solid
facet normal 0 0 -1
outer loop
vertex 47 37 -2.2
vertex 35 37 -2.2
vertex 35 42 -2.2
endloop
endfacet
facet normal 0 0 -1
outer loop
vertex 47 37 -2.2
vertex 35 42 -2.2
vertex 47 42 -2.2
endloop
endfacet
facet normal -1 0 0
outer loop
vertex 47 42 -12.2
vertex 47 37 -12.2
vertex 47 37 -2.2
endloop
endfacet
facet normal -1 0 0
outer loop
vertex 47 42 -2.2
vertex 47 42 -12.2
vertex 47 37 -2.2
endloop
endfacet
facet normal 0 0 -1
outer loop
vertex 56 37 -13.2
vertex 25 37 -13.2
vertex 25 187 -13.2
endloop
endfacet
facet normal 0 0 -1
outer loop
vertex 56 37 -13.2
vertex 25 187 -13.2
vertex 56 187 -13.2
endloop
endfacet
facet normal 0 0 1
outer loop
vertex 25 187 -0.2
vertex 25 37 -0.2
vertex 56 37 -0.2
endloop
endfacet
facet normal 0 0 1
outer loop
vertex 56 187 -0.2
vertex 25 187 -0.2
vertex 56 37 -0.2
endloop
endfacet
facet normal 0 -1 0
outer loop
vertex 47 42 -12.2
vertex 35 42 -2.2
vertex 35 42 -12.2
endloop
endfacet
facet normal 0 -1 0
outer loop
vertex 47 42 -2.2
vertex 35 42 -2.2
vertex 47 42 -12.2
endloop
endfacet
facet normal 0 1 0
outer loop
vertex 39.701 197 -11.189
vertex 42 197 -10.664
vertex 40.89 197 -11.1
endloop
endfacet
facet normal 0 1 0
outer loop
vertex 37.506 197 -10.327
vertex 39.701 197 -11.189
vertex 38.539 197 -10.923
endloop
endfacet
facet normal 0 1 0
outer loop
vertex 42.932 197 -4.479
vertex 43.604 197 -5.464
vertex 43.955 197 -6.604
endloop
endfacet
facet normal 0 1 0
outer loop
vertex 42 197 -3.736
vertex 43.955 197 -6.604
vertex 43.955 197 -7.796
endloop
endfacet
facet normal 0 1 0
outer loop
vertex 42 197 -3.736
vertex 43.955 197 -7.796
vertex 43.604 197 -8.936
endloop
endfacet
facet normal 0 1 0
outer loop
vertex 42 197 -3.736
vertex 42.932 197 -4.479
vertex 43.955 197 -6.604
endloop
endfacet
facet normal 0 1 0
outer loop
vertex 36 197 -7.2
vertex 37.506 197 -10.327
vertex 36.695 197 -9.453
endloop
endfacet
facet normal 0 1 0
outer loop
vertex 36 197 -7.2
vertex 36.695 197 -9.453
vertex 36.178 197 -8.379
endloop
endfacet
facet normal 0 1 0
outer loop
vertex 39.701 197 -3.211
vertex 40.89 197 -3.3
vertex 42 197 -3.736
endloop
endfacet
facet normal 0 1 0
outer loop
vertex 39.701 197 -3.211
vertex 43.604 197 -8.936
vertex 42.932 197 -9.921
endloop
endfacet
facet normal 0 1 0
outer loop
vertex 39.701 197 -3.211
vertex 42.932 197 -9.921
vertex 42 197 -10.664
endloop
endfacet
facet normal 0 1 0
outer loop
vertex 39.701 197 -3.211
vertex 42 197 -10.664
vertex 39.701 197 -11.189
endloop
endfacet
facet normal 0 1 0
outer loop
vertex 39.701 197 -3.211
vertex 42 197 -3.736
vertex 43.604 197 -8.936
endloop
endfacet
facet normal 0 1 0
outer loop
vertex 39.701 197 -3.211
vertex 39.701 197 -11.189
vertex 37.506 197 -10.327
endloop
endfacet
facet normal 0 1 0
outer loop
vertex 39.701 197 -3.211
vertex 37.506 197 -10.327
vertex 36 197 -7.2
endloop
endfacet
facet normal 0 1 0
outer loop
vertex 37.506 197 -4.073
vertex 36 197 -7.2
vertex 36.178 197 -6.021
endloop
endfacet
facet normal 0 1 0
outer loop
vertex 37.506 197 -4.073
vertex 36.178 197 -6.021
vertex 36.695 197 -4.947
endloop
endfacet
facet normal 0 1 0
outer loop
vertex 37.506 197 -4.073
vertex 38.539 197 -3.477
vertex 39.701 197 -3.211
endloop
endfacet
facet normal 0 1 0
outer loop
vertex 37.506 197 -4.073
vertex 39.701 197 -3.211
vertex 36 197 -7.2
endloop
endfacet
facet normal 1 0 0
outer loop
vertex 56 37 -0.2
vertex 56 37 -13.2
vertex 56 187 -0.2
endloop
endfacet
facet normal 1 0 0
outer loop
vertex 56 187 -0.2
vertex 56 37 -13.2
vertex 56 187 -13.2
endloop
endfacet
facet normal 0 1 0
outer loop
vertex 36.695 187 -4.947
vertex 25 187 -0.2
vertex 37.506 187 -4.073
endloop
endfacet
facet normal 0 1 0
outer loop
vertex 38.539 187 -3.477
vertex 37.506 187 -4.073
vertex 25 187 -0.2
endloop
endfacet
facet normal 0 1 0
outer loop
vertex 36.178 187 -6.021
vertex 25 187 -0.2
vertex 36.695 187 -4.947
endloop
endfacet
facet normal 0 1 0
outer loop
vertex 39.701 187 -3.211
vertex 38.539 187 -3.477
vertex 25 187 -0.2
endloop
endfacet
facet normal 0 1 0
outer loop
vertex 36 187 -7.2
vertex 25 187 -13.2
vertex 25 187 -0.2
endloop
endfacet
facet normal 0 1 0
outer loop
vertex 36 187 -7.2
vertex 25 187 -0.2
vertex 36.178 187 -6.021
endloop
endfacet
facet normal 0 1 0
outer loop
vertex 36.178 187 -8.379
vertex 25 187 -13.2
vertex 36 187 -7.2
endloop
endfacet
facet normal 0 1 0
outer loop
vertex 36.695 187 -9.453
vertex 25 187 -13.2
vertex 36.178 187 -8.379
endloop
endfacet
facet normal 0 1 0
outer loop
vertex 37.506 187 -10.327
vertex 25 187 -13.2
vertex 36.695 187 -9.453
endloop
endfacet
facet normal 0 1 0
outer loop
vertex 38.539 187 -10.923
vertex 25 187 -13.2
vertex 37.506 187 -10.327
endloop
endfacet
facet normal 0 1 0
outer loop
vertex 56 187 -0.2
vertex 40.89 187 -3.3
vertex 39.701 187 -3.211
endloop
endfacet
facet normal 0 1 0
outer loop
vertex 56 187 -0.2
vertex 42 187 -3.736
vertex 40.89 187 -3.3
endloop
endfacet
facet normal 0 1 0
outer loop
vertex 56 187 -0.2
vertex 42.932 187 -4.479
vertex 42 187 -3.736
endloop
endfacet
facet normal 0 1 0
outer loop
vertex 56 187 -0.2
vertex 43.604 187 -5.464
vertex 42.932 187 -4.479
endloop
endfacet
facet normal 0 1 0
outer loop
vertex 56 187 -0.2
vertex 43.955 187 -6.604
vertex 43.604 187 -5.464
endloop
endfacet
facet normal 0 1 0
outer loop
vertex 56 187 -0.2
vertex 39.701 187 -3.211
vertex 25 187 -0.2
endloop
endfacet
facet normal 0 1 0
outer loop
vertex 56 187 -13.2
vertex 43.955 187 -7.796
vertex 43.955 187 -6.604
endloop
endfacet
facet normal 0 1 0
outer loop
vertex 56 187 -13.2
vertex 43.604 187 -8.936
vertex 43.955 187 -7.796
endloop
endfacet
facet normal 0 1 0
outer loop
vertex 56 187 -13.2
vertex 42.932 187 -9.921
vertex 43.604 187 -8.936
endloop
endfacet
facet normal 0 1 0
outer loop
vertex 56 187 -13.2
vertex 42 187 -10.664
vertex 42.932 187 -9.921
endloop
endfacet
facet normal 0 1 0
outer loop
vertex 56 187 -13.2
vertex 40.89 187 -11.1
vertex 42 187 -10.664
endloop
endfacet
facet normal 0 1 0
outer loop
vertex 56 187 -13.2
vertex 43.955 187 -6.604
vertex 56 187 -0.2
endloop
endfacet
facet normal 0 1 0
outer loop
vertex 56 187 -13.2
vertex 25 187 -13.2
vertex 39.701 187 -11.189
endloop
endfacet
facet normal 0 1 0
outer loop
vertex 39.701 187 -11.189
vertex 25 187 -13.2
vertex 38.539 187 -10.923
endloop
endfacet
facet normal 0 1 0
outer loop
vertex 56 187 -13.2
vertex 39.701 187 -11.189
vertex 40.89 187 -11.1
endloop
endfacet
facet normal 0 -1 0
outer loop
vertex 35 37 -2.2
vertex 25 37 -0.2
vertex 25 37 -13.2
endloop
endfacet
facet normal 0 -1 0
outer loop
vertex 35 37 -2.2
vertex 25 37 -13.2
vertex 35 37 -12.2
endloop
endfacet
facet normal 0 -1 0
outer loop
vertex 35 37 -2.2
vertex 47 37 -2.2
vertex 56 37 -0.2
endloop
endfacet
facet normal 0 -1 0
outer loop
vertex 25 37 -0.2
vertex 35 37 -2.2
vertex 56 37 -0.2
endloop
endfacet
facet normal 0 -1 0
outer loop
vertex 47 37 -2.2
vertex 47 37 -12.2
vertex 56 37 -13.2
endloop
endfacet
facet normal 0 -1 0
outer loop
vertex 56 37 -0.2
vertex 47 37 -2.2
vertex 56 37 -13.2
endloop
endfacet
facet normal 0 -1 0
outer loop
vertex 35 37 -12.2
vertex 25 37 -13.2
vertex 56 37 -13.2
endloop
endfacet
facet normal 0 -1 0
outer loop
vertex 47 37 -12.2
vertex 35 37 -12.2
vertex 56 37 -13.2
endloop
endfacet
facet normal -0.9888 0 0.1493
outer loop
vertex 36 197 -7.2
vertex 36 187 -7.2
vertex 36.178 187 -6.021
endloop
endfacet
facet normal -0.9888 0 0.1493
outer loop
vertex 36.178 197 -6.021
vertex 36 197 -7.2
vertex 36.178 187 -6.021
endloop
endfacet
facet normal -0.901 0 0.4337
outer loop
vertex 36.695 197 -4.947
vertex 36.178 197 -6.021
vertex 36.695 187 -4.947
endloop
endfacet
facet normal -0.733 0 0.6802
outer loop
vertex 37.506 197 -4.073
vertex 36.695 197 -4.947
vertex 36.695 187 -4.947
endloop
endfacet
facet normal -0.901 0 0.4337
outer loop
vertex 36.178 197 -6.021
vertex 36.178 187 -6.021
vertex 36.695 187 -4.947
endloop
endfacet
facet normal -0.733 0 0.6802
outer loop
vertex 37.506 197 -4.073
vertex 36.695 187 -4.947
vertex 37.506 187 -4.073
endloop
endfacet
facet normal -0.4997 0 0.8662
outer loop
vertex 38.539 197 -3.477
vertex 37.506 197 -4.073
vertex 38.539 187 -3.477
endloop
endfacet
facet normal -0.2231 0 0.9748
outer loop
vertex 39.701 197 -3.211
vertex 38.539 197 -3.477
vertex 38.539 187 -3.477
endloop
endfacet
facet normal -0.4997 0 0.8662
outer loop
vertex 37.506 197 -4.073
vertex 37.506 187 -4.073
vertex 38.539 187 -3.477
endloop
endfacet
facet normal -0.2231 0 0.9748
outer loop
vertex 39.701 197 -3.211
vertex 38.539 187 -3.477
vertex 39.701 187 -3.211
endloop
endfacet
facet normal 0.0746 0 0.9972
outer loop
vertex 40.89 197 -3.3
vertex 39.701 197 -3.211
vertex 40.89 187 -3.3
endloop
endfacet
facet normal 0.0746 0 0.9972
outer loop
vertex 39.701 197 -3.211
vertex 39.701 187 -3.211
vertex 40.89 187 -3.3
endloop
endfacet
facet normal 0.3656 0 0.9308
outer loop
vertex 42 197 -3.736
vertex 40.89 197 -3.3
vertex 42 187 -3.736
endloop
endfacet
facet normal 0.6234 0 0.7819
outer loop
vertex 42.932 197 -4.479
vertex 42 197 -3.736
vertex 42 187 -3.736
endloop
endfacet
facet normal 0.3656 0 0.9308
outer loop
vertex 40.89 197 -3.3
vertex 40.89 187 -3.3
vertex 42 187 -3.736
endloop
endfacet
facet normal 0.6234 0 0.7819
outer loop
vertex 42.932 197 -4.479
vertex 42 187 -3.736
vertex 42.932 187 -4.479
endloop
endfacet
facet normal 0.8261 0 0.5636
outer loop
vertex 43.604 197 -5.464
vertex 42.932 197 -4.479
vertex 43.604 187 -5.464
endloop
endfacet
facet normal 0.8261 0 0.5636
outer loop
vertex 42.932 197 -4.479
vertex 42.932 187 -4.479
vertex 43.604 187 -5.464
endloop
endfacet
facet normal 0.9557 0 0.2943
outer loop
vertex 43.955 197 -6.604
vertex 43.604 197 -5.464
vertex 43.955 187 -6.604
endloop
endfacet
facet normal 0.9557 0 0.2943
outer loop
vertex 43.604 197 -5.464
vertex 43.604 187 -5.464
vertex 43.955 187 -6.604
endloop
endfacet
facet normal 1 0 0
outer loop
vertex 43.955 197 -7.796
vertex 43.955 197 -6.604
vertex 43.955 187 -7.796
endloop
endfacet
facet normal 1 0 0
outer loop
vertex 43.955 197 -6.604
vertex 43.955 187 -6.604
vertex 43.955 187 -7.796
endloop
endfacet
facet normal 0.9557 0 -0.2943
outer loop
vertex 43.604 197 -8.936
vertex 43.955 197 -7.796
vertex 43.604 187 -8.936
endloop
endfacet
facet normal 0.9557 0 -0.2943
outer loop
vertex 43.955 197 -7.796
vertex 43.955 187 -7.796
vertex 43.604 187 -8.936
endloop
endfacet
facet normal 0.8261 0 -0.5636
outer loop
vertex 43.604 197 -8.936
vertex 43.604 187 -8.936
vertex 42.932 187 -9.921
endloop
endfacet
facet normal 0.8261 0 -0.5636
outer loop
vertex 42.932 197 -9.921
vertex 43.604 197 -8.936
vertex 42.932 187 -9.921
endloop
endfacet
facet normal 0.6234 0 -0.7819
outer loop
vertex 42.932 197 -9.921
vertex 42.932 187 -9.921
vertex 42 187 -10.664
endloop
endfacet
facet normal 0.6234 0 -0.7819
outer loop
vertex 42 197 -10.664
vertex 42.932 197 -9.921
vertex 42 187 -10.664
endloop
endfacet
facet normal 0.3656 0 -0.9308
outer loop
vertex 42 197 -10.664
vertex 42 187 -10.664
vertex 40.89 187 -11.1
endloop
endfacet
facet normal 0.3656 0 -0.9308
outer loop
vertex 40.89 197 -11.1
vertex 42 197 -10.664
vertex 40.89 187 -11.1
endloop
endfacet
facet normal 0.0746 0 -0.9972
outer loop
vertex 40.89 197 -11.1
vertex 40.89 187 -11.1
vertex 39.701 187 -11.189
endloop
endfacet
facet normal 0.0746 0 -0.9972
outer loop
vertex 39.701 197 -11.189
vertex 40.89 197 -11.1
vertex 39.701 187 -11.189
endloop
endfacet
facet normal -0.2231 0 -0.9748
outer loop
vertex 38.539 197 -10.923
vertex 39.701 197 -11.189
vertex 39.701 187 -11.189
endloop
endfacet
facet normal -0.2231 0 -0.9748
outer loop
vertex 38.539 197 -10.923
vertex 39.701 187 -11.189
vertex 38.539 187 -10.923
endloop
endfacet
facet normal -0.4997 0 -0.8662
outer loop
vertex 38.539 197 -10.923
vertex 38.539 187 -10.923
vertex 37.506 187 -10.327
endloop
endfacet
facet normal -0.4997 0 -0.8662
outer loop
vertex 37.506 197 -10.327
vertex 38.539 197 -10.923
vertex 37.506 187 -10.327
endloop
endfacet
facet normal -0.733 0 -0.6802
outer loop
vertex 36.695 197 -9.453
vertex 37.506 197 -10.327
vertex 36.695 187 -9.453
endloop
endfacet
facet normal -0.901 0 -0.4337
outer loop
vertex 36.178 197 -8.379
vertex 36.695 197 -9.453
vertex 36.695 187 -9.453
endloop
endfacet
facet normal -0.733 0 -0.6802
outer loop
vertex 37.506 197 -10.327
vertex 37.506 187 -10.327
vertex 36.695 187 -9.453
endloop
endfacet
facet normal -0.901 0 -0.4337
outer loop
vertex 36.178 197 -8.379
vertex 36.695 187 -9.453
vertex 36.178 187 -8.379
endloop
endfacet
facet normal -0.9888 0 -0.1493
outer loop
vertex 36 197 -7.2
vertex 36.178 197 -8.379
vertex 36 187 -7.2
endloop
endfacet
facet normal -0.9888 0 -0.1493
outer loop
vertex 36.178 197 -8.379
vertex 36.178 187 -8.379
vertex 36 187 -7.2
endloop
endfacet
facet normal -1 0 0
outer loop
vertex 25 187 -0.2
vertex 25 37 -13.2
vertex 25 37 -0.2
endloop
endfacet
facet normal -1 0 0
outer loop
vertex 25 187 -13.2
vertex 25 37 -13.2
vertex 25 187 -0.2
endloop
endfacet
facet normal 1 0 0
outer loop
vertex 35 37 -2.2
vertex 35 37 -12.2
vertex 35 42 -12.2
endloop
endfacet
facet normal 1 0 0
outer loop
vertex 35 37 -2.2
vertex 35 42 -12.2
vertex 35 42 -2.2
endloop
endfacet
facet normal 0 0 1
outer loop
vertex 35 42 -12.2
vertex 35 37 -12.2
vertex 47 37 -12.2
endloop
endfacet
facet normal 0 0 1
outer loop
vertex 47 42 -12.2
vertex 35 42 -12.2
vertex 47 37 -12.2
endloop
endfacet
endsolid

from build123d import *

# Parameters (mm, degrees)
SKETCH015_W     = 31
SKETCH015_H     = 150
PAD010_DEPTH    = 13
SKETCH016_W     = 12
SKETCH016_H     = 10
POCKET004_DEPTH = 5
SKETCH017_R     = 4
PAD011_DEPTH    = 10


with BuildPart() as part:
    # Sketch015 → Pad010 (new body)
    with BuildSketch(Plane.XY):
        with Locations((15.5, 75)):
            Rectangle(SKETCH015_W, SKETCH015_H)
    extrude(amount=PAD010_DEPTH)

    # Sketch016 (on Face1 of Pad010) → Pocket004 (cut)
    with BuildSketch(Plane.XZ):
        with Locations((16, 6)):
            Rectangle(SKETCH016_W, SKETCH016_H)
    extrude(amount=-POCKET004_DEPTH, mode=Mode.SUBTRACT)

    # Sketch017 (on Face10 of Pocket004) → Pad011 (join)
    with BuildSketch(Plane(origin=(0, 150, 0), x_dir=(-1, 0, 0), z_dir=(0, 1, 0))):
        with Locations((-15, 6)):
            Circle(SKETCH017_R)
    extrude(amount=PAD011_DEPTH)


with BuildPart() as part_1:
    # Body008 placement: moved
    add(part.part.moved(Location((25, 37, -13.2))))


solid = part_1.part
